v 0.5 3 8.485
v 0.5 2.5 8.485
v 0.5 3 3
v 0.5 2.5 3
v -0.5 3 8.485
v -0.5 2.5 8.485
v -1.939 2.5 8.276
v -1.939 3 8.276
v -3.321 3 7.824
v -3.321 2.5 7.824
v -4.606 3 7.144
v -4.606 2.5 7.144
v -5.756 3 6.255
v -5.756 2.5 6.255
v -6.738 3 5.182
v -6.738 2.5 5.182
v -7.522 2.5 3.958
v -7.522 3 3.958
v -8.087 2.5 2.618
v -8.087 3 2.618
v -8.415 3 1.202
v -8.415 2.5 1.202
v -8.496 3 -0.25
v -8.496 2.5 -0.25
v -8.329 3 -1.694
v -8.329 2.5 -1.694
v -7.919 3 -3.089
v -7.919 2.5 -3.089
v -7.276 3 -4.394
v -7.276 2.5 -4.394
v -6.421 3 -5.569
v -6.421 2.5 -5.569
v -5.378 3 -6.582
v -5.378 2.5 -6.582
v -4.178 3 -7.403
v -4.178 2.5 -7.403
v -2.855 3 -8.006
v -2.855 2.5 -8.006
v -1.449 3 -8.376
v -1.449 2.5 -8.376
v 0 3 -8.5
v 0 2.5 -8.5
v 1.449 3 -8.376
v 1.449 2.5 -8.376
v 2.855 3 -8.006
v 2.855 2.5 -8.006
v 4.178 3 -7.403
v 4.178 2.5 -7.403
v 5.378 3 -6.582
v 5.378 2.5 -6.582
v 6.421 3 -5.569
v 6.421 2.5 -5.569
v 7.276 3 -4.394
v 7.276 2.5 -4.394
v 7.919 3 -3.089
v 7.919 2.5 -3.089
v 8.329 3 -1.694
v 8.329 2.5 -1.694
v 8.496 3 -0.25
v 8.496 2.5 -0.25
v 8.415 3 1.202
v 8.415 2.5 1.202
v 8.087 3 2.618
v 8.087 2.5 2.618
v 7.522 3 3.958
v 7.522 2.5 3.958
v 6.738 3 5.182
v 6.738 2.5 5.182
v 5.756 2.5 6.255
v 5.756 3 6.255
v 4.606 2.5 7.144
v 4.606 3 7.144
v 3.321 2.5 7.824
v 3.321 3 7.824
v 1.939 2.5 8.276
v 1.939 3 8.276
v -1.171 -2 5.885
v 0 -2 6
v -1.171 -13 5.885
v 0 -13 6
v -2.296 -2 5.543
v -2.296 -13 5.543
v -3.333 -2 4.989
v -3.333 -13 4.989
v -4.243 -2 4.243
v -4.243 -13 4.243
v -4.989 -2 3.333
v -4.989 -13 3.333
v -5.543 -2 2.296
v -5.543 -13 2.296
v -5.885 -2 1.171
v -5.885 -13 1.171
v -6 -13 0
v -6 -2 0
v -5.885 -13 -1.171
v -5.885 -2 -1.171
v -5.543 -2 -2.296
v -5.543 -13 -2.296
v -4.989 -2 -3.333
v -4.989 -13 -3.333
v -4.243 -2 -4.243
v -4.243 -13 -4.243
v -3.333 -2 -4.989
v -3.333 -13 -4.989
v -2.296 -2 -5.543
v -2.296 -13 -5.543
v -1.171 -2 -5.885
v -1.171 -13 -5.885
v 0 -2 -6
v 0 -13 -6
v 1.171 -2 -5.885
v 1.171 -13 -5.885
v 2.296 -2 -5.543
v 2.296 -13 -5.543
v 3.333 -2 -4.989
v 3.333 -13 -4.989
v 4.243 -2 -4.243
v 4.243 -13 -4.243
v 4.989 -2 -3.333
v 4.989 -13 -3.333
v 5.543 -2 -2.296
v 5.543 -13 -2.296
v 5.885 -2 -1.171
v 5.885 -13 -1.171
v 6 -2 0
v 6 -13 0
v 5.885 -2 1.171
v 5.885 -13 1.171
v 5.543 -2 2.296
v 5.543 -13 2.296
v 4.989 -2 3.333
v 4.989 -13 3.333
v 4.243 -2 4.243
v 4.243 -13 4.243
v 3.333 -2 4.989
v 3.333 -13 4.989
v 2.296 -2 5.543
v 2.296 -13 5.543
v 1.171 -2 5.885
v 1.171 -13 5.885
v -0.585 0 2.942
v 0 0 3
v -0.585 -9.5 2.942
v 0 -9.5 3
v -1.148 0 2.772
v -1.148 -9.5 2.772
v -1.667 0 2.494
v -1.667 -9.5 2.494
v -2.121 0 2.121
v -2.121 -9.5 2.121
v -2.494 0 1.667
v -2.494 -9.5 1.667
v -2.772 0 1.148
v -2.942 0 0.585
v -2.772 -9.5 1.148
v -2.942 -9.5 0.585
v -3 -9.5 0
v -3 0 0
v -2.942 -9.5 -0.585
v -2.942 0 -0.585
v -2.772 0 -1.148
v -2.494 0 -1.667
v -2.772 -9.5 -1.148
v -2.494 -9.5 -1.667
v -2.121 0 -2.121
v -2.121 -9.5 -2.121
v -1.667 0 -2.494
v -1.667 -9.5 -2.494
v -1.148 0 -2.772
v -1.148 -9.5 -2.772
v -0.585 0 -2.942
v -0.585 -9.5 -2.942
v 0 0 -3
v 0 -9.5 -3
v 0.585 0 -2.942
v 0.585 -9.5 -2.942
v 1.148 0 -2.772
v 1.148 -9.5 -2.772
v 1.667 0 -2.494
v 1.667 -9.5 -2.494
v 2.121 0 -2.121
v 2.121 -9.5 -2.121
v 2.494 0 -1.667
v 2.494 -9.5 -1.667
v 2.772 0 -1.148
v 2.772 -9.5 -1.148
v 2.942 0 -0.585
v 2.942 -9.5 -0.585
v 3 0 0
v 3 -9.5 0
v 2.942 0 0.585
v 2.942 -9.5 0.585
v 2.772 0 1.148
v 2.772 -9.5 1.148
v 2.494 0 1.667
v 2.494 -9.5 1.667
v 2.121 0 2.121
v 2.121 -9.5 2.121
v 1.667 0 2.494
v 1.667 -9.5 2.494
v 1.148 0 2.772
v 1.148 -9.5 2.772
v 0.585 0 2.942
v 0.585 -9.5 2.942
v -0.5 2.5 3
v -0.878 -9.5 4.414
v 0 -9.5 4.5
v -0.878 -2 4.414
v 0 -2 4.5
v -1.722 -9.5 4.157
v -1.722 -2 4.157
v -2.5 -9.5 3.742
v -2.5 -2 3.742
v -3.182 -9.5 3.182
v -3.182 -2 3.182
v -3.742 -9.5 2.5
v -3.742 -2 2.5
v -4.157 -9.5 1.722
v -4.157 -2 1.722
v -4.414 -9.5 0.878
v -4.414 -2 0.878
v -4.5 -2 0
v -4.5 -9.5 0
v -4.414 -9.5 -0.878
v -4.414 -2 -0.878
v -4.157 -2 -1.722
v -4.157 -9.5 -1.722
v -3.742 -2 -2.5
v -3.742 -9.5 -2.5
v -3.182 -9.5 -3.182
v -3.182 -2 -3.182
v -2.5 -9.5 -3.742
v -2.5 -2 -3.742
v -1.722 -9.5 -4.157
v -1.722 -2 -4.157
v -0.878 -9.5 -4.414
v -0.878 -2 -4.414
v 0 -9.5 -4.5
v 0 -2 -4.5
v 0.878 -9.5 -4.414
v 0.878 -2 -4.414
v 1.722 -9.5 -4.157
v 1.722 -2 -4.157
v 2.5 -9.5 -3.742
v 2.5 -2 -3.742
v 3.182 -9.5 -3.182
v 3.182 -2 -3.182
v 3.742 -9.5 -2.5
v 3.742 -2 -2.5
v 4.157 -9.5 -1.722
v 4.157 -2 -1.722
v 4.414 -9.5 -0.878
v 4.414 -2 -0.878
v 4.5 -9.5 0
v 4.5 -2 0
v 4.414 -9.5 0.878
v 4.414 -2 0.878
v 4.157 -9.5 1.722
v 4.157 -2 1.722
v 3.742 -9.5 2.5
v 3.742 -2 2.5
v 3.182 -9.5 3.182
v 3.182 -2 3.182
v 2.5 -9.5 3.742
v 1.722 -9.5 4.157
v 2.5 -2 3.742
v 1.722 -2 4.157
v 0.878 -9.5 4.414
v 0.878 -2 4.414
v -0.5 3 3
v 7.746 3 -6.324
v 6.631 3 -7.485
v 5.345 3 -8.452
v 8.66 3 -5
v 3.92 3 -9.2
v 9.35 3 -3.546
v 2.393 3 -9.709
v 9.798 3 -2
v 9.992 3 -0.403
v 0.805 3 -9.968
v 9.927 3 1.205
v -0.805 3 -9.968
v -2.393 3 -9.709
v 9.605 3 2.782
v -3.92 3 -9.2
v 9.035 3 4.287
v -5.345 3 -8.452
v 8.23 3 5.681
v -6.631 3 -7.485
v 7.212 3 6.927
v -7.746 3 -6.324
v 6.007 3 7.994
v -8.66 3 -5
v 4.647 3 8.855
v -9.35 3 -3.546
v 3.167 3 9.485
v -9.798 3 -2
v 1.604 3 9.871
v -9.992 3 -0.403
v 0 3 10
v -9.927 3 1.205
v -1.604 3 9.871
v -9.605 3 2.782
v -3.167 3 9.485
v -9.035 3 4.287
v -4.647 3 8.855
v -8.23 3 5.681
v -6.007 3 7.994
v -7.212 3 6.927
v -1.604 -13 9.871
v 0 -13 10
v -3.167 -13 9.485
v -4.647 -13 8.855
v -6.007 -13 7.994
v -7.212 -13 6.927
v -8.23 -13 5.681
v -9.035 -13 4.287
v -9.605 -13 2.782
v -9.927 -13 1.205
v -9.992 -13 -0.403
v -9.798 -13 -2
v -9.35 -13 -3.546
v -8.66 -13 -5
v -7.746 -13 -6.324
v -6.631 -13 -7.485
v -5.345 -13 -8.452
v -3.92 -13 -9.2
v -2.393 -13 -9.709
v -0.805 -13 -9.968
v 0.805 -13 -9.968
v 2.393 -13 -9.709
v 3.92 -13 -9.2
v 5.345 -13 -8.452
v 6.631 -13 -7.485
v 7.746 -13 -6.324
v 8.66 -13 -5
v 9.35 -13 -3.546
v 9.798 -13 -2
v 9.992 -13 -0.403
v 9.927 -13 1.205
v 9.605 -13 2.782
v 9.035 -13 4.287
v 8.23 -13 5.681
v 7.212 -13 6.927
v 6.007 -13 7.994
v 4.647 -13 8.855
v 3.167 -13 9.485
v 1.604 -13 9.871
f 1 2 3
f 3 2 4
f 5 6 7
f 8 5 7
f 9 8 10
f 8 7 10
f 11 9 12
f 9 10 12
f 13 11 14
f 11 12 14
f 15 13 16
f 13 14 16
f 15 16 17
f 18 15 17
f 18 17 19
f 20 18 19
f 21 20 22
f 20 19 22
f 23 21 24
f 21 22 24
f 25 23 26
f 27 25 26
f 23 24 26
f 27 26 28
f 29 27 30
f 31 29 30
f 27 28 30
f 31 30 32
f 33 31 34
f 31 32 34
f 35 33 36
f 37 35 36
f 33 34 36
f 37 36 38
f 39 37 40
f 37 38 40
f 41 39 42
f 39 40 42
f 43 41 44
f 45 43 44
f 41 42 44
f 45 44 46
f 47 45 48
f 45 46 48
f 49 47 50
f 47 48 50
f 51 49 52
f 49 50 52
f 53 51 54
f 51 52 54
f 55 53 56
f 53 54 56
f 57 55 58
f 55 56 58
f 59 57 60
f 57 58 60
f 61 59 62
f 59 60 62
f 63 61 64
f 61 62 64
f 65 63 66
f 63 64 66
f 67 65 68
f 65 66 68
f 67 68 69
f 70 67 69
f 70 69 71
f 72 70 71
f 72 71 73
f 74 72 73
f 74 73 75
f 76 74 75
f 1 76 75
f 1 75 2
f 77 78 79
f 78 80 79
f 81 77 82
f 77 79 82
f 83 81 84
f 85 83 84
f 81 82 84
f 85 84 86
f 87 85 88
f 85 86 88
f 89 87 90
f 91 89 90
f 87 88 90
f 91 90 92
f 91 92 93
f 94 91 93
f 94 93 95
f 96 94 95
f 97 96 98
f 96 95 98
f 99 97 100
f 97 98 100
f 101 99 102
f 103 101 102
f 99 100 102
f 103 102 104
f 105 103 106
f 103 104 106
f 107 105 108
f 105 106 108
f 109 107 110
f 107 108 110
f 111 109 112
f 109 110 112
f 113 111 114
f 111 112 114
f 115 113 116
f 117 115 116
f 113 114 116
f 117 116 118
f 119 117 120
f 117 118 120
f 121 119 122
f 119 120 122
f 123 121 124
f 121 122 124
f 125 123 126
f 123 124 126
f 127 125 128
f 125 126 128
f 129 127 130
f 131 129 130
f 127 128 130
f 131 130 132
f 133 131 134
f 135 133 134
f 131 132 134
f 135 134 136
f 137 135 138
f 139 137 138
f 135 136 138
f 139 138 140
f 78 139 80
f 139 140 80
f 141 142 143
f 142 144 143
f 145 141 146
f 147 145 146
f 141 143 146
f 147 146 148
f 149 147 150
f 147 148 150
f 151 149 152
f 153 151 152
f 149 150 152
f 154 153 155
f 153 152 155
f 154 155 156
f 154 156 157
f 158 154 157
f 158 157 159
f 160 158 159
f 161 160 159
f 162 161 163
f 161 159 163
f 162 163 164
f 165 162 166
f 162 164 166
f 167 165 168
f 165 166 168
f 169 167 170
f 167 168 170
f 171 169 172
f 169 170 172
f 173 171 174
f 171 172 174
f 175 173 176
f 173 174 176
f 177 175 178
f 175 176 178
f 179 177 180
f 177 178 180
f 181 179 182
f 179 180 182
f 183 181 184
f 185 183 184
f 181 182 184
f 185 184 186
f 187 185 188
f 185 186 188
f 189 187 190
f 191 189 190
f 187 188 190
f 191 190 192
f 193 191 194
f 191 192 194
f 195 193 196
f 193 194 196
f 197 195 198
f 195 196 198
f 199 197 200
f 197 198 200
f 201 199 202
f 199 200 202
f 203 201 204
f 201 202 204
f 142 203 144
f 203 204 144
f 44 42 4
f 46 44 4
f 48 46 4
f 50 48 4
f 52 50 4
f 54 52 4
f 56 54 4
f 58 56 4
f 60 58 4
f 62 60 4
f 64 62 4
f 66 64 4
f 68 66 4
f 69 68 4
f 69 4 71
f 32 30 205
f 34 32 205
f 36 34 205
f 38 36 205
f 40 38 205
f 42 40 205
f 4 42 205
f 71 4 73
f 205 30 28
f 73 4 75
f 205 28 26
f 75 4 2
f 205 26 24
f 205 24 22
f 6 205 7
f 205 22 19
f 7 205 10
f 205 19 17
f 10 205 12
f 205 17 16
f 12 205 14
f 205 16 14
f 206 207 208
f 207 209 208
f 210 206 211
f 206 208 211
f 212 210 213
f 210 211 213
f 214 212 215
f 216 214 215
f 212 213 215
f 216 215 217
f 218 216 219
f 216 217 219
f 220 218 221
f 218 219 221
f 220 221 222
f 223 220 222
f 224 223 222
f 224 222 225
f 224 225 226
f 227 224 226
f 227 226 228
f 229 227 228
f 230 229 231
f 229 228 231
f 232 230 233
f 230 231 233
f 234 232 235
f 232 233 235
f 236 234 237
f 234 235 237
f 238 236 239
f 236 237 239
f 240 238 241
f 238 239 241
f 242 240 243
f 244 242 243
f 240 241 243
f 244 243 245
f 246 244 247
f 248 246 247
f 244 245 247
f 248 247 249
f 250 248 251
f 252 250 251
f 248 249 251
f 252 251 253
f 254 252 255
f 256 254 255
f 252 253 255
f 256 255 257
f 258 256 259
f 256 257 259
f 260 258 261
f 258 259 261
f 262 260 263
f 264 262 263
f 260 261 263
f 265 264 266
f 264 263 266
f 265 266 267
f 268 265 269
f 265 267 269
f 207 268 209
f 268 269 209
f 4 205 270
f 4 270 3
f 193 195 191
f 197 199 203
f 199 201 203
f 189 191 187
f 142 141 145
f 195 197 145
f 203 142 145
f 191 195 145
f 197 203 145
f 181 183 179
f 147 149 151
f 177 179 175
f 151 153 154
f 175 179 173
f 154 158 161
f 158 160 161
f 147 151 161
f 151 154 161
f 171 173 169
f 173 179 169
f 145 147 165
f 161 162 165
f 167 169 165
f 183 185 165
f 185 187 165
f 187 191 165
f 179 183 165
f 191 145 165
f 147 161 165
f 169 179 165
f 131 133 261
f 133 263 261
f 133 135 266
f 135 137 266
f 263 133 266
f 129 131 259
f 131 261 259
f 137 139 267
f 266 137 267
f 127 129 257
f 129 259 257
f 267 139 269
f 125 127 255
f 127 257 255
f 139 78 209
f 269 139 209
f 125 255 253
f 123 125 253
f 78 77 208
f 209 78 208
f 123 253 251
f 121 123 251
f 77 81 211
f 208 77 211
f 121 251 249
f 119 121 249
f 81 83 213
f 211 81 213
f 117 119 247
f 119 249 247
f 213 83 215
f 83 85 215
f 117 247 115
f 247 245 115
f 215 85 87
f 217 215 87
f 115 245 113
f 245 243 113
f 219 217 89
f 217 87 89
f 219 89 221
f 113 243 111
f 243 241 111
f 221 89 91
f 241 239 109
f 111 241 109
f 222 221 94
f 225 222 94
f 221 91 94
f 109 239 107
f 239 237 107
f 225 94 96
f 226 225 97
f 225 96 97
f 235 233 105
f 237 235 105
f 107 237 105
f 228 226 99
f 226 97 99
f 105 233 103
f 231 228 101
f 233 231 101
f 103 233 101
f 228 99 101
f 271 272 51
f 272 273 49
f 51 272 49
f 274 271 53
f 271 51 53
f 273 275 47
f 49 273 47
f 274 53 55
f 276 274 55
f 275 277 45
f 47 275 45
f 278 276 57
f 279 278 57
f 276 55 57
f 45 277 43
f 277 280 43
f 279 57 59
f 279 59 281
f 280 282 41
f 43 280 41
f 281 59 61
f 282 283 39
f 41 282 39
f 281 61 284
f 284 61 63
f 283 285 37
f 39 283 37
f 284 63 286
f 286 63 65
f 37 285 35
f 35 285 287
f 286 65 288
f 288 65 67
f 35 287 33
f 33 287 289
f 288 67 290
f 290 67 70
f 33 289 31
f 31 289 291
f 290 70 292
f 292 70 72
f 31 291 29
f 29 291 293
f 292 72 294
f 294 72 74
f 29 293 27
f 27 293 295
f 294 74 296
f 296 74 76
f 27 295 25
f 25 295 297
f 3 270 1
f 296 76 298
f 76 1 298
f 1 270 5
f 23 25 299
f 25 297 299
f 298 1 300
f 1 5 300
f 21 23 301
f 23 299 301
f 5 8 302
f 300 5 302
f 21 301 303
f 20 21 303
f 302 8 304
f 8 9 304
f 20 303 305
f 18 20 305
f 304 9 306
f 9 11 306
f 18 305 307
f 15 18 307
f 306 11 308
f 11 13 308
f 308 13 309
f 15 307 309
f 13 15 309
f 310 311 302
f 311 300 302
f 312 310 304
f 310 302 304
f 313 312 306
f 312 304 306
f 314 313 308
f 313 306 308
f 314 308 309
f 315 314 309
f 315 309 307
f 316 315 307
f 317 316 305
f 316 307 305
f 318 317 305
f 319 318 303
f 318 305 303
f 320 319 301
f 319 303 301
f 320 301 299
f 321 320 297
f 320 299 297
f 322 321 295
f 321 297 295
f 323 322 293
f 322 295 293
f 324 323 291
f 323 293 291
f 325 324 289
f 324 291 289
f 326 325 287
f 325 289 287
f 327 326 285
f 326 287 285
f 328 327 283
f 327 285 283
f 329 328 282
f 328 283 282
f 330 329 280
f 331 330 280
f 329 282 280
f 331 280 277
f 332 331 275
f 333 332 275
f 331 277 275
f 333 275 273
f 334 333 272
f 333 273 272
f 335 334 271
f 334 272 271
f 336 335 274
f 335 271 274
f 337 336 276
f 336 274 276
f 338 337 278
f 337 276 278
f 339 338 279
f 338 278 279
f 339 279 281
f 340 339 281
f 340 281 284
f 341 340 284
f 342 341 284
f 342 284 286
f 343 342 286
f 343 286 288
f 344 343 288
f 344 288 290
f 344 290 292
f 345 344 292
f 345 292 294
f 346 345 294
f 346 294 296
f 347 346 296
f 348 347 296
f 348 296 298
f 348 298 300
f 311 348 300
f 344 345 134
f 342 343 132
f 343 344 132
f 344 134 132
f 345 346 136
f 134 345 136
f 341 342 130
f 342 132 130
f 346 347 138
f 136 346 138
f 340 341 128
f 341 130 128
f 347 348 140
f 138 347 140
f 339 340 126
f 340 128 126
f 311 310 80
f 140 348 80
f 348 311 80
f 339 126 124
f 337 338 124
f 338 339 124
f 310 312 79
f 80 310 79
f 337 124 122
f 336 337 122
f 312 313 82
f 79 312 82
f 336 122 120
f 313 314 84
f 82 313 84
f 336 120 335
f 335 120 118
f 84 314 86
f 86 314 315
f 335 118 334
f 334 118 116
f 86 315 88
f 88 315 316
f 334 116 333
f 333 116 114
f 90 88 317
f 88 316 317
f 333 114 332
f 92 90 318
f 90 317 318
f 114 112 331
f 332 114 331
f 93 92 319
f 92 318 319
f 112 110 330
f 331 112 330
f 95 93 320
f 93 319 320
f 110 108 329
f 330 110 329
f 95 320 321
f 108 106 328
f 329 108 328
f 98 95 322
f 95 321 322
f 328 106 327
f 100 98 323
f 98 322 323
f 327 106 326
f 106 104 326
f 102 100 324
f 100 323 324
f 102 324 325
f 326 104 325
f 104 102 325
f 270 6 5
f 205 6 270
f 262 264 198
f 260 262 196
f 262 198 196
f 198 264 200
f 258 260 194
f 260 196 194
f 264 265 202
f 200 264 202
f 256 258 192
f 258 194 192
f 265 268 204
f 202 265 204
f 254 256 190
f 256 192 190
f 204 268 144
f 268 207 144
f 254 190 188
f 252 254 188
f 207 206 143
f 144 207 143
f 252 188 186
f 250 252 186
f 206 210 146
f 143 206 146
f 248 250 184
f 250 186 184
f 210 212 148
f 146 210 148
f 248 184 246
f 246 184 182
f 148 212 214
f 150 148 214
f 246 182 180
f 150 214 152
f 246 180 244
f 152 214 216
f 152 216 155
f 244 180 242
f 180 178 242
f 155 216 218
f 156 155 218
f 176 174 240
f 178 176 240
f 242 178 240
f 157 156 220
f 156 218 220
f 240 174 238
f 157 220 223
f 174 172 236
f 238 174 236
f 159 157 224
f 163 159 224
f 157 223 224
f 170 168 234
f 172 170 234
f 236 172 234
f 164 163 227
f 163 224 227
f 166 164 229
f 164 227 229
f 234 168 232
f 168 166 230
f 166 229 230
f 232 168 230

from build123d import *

# Parameters (mm, degrees)
SKETCH_2_W      = 1
SKETCH_2_H      = 5.5
EXTRUDE_1_DEPTH = 0.5


with BuildPart() as part:
    # Эскиз1 → Повернуть1 (revolve)
    with BuildSketch(Plane(origin=(0, 0, 0), x_dir=(0, 0, -1), z_dir=(1, 0, 0))):
        Polygon((0, 0), (-3, 0), (-3, -9.5), (-4.5, -9.5), (-4.5, -2), (-6, -2), (-6, -13), (-10, -13), (-10, 3), (-8.5, 3), (-8.5, 2.5), (0, 2.5), align=None)
    revolve(axis=Axis((0, 2.5, 0), (0, -1, 0)))

    # Эскиз2 → Бобышка-Вытянуть1 (add)
    with BuildSketch(Plane(origin=(0, 2.5, 0), x_dir=(1, 0, 0), z_dir=(0, 1, 0))):
        with Locations((0, -5.75)):
            Rectangle(SKETCH_2_W, SKETCH_2_H)
    extrude(amount=EXTRUDE_1_DEPTH)


solid = part.part
